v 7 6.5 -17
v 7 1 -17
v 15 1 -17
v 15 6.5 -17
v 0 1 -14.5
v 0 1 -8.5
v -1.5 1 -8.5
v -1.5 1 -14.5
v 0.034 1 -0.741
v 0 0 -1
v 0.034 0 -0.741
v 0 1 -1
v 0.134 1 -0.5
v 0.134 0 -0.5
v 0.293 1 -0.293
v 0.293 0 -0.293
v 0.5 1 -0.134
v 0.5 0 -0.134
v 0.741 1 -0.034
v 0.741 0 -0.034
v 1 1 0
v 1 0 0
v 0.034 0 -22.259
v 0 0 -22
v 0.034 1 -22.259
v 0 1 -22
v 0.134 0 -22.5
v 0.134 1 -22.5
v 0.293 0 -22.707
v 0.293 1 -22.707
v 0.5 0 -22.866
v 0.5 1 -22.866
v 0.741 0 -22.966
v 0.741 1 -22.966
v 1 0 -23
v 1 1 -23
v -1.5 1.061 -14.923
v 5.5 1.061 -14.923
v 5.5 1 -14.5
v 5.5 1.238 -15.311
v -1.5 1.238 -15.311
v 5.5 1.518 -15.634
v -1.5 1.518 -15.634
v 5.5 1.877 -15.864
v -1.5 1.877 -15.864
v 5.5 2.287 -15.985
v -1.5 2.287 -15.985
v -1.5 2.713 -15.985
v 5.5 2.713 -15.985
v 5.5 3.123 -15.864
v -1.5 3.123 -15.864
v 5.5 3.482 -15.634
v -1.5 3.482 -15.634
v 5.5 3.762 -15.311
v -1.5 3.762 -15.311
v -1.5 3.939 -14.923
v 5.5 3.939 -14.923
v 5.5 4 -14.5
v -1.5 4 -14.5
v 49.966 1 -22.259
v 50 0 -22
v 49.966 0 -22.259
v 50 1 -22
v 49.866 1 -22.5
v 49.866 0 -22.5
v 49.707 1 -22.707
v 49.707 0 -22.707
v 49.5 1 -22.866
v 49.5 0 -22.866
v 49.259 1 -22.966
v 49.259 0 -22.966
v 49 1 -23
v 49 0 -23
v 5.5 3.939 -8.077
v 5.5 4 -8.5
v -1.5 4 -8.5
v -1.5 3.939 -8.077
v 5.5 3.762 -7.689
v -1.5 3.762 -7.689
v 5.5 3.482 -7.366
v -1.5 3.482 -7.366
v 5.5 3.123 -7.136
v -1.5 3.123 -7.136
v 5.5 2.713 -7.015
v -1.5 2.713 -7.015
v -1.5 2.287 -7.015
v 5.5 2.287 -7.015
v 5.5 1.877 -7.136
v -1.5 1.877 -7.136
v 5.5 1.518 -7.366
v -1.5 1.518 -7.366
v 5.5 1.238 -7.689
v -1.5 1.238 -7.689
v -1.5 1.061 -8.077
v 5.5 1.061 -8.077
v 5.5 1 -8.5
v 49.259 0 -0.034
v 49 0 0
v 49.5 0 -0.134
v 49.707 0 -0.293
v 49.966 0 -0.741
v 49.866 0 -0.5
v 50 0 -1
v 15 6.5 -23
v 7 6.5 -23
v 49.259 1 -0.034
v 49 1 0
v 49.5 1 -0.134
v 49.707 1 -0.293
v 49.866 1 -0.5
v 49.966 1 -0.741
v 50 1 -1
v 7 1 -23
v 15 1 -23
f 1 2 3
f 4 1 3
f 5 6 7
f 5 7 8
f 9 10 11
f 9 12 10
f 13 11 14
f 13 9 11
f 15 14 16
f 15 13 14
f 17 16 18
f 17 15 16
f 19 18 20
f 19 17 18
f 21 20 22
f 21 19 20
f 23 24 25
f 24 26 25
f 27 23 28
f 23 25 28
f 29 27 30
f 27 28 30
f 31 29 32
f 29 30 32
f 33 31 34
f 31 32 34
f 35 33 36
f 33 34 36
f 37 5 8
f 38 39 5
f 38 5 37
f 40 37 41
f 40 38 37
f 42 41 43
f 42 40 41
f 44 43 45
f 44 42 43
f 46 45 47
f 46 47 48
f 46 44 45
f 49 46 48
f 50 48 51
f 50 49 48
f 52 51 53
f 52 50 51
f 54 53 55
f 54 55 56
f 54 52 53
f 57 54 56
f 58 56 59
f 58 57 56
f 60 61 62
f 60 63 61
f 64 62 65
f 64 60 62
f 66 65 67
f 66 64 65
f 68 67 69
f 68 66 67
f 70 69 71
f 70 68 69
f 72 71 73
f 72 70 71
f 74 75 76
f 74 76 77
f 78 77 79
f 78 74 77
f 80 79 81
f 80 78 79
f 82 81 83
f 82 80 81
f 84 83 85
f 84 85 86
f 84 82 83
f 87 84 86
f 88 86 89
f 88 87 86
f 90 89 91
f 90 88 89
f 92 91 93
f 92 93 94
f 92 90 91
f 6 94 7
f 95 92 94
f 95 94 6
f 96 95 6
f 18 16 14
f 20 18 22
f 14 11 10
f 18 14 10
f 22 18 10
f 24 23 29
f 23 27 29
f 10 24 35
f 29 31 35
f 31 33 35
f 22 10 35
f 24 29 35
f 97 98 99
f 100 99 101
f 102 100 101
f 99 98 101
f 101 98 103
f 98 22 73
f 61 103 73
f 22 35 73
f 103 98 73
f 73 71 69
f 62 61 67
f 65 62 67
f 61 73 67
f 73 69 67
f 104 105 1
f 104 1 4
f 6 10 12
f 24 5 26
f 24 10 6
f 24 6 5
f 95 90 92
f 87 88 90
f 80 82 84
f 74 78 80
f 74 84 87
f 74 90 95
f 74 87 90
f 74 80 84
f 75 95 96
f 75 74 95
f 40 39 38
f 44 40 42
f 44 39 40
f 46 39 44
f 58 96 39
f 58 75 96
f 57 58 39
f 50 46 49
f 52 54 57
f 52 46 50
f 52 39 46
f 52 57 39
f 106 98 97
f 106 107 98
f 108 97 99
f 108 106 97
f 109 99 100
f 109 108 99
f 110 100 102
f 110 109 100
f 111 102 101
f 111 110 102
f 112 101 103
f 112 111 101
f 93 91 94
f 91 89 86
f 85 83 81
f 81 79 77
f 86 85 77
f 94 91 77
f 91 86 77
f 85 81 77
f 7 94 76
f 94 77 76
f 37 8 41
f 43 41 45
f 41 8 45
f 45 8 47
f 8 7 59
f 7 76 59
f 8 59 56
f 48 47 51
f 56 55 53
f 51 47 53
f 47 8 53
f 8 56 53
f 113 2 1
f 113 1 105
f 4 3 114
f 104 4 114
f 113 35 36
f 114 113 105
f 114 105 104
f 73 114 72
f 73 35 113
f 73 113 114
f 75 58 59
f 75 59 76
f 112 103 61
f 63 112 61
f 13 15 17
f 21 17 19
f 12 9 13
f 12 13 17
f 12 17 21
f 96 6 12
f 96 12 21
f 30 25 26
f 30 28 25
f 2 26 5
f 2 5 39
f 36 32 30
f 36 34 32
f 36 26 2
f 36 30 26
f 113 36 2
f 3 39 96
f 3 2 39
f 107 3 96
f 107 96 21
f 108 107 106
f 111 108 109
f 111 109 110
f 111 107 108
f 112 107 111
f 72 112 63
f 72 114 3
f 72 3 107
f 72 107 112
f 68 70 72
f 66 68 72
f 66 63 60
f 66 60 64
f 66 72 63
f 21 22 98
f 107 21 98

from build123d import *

# Parameters (mm, degrees)
SKETCH1_W                = 50
SKETCH1_H                = 23
BOSS_EXTRUDE1_DEPTH      = 1
FILLET1_R                = 1
BOSS_EXTRUDE2_DEPTH      = 1.5
BOSS_EXTRUDE2_DEPTH_BACK = 5.5
SKETCH3_W                = 8
SKETCH3_H                = 6
BOSS_EXTRUDE3_DEPTH      = 5.5


with BuildPart() as part:
    # Sketch1 → Boss-Extrude1 (new body)
    with BuildSketch(Plane(origin=(0, 0, 0), x_dir=(1, 0, 0), z_dir=(0, 1, 0))):
        with Locations((25, 11.5)):
            Rectangle(SKETCH1_W, SKETCH1_H)
    extrude(amount=BOSS_EXTRUDE1_DEPTH)

    # Fillet1
    fillet1_edges = [part.edges().sort_by_distance(p)[0] for p in [
        (0, 0.5, -23),
        (50, 0.5, -23),
        (50, 0.5, 0),
        (0, 0.5, 0),
    ]]
    fillet(fillet1_edges, radius=FILLET1_R)

    # Sketch2 → Boss-Extrude2 (add, two sides: drawn at the far end of the back side and taken through both)
    with BuildSketch(Plane.ZY.offset(-BOSS_EXTRUDE2_DEPTH_BACK)):
        with BuildLine():
            Line((-8.5, 1), (-14.5, 1))
            ThreePointArc((-14.5, 1), (-16, 2.5), (-14.5, 4))
            Line((-14.5, 4), (-8.5, 4))
            ThreePointArc((-8.5, 4), (-7, 2.5), (-8.5, 1))
        make_face()
    extrude(amount=BOSS_EXTRUDE2_DEPTH + BOSS_EXTRUDE2_DEPTH_BACK)

    # Sketch3 → Boss-Extrude3 (add)
    with BuildSketch(Plane(origin=(0, 1, 0), x_dir=(1, 0, 0), z_dir=(0, 1, 0))):
        with Locations((11, 20)):
            Rectangle(SKETCH3_W, SKETCH3_H)
    extrude(amount=BOSS_EXTRUDE3_DEPTH)


solid = part.part
